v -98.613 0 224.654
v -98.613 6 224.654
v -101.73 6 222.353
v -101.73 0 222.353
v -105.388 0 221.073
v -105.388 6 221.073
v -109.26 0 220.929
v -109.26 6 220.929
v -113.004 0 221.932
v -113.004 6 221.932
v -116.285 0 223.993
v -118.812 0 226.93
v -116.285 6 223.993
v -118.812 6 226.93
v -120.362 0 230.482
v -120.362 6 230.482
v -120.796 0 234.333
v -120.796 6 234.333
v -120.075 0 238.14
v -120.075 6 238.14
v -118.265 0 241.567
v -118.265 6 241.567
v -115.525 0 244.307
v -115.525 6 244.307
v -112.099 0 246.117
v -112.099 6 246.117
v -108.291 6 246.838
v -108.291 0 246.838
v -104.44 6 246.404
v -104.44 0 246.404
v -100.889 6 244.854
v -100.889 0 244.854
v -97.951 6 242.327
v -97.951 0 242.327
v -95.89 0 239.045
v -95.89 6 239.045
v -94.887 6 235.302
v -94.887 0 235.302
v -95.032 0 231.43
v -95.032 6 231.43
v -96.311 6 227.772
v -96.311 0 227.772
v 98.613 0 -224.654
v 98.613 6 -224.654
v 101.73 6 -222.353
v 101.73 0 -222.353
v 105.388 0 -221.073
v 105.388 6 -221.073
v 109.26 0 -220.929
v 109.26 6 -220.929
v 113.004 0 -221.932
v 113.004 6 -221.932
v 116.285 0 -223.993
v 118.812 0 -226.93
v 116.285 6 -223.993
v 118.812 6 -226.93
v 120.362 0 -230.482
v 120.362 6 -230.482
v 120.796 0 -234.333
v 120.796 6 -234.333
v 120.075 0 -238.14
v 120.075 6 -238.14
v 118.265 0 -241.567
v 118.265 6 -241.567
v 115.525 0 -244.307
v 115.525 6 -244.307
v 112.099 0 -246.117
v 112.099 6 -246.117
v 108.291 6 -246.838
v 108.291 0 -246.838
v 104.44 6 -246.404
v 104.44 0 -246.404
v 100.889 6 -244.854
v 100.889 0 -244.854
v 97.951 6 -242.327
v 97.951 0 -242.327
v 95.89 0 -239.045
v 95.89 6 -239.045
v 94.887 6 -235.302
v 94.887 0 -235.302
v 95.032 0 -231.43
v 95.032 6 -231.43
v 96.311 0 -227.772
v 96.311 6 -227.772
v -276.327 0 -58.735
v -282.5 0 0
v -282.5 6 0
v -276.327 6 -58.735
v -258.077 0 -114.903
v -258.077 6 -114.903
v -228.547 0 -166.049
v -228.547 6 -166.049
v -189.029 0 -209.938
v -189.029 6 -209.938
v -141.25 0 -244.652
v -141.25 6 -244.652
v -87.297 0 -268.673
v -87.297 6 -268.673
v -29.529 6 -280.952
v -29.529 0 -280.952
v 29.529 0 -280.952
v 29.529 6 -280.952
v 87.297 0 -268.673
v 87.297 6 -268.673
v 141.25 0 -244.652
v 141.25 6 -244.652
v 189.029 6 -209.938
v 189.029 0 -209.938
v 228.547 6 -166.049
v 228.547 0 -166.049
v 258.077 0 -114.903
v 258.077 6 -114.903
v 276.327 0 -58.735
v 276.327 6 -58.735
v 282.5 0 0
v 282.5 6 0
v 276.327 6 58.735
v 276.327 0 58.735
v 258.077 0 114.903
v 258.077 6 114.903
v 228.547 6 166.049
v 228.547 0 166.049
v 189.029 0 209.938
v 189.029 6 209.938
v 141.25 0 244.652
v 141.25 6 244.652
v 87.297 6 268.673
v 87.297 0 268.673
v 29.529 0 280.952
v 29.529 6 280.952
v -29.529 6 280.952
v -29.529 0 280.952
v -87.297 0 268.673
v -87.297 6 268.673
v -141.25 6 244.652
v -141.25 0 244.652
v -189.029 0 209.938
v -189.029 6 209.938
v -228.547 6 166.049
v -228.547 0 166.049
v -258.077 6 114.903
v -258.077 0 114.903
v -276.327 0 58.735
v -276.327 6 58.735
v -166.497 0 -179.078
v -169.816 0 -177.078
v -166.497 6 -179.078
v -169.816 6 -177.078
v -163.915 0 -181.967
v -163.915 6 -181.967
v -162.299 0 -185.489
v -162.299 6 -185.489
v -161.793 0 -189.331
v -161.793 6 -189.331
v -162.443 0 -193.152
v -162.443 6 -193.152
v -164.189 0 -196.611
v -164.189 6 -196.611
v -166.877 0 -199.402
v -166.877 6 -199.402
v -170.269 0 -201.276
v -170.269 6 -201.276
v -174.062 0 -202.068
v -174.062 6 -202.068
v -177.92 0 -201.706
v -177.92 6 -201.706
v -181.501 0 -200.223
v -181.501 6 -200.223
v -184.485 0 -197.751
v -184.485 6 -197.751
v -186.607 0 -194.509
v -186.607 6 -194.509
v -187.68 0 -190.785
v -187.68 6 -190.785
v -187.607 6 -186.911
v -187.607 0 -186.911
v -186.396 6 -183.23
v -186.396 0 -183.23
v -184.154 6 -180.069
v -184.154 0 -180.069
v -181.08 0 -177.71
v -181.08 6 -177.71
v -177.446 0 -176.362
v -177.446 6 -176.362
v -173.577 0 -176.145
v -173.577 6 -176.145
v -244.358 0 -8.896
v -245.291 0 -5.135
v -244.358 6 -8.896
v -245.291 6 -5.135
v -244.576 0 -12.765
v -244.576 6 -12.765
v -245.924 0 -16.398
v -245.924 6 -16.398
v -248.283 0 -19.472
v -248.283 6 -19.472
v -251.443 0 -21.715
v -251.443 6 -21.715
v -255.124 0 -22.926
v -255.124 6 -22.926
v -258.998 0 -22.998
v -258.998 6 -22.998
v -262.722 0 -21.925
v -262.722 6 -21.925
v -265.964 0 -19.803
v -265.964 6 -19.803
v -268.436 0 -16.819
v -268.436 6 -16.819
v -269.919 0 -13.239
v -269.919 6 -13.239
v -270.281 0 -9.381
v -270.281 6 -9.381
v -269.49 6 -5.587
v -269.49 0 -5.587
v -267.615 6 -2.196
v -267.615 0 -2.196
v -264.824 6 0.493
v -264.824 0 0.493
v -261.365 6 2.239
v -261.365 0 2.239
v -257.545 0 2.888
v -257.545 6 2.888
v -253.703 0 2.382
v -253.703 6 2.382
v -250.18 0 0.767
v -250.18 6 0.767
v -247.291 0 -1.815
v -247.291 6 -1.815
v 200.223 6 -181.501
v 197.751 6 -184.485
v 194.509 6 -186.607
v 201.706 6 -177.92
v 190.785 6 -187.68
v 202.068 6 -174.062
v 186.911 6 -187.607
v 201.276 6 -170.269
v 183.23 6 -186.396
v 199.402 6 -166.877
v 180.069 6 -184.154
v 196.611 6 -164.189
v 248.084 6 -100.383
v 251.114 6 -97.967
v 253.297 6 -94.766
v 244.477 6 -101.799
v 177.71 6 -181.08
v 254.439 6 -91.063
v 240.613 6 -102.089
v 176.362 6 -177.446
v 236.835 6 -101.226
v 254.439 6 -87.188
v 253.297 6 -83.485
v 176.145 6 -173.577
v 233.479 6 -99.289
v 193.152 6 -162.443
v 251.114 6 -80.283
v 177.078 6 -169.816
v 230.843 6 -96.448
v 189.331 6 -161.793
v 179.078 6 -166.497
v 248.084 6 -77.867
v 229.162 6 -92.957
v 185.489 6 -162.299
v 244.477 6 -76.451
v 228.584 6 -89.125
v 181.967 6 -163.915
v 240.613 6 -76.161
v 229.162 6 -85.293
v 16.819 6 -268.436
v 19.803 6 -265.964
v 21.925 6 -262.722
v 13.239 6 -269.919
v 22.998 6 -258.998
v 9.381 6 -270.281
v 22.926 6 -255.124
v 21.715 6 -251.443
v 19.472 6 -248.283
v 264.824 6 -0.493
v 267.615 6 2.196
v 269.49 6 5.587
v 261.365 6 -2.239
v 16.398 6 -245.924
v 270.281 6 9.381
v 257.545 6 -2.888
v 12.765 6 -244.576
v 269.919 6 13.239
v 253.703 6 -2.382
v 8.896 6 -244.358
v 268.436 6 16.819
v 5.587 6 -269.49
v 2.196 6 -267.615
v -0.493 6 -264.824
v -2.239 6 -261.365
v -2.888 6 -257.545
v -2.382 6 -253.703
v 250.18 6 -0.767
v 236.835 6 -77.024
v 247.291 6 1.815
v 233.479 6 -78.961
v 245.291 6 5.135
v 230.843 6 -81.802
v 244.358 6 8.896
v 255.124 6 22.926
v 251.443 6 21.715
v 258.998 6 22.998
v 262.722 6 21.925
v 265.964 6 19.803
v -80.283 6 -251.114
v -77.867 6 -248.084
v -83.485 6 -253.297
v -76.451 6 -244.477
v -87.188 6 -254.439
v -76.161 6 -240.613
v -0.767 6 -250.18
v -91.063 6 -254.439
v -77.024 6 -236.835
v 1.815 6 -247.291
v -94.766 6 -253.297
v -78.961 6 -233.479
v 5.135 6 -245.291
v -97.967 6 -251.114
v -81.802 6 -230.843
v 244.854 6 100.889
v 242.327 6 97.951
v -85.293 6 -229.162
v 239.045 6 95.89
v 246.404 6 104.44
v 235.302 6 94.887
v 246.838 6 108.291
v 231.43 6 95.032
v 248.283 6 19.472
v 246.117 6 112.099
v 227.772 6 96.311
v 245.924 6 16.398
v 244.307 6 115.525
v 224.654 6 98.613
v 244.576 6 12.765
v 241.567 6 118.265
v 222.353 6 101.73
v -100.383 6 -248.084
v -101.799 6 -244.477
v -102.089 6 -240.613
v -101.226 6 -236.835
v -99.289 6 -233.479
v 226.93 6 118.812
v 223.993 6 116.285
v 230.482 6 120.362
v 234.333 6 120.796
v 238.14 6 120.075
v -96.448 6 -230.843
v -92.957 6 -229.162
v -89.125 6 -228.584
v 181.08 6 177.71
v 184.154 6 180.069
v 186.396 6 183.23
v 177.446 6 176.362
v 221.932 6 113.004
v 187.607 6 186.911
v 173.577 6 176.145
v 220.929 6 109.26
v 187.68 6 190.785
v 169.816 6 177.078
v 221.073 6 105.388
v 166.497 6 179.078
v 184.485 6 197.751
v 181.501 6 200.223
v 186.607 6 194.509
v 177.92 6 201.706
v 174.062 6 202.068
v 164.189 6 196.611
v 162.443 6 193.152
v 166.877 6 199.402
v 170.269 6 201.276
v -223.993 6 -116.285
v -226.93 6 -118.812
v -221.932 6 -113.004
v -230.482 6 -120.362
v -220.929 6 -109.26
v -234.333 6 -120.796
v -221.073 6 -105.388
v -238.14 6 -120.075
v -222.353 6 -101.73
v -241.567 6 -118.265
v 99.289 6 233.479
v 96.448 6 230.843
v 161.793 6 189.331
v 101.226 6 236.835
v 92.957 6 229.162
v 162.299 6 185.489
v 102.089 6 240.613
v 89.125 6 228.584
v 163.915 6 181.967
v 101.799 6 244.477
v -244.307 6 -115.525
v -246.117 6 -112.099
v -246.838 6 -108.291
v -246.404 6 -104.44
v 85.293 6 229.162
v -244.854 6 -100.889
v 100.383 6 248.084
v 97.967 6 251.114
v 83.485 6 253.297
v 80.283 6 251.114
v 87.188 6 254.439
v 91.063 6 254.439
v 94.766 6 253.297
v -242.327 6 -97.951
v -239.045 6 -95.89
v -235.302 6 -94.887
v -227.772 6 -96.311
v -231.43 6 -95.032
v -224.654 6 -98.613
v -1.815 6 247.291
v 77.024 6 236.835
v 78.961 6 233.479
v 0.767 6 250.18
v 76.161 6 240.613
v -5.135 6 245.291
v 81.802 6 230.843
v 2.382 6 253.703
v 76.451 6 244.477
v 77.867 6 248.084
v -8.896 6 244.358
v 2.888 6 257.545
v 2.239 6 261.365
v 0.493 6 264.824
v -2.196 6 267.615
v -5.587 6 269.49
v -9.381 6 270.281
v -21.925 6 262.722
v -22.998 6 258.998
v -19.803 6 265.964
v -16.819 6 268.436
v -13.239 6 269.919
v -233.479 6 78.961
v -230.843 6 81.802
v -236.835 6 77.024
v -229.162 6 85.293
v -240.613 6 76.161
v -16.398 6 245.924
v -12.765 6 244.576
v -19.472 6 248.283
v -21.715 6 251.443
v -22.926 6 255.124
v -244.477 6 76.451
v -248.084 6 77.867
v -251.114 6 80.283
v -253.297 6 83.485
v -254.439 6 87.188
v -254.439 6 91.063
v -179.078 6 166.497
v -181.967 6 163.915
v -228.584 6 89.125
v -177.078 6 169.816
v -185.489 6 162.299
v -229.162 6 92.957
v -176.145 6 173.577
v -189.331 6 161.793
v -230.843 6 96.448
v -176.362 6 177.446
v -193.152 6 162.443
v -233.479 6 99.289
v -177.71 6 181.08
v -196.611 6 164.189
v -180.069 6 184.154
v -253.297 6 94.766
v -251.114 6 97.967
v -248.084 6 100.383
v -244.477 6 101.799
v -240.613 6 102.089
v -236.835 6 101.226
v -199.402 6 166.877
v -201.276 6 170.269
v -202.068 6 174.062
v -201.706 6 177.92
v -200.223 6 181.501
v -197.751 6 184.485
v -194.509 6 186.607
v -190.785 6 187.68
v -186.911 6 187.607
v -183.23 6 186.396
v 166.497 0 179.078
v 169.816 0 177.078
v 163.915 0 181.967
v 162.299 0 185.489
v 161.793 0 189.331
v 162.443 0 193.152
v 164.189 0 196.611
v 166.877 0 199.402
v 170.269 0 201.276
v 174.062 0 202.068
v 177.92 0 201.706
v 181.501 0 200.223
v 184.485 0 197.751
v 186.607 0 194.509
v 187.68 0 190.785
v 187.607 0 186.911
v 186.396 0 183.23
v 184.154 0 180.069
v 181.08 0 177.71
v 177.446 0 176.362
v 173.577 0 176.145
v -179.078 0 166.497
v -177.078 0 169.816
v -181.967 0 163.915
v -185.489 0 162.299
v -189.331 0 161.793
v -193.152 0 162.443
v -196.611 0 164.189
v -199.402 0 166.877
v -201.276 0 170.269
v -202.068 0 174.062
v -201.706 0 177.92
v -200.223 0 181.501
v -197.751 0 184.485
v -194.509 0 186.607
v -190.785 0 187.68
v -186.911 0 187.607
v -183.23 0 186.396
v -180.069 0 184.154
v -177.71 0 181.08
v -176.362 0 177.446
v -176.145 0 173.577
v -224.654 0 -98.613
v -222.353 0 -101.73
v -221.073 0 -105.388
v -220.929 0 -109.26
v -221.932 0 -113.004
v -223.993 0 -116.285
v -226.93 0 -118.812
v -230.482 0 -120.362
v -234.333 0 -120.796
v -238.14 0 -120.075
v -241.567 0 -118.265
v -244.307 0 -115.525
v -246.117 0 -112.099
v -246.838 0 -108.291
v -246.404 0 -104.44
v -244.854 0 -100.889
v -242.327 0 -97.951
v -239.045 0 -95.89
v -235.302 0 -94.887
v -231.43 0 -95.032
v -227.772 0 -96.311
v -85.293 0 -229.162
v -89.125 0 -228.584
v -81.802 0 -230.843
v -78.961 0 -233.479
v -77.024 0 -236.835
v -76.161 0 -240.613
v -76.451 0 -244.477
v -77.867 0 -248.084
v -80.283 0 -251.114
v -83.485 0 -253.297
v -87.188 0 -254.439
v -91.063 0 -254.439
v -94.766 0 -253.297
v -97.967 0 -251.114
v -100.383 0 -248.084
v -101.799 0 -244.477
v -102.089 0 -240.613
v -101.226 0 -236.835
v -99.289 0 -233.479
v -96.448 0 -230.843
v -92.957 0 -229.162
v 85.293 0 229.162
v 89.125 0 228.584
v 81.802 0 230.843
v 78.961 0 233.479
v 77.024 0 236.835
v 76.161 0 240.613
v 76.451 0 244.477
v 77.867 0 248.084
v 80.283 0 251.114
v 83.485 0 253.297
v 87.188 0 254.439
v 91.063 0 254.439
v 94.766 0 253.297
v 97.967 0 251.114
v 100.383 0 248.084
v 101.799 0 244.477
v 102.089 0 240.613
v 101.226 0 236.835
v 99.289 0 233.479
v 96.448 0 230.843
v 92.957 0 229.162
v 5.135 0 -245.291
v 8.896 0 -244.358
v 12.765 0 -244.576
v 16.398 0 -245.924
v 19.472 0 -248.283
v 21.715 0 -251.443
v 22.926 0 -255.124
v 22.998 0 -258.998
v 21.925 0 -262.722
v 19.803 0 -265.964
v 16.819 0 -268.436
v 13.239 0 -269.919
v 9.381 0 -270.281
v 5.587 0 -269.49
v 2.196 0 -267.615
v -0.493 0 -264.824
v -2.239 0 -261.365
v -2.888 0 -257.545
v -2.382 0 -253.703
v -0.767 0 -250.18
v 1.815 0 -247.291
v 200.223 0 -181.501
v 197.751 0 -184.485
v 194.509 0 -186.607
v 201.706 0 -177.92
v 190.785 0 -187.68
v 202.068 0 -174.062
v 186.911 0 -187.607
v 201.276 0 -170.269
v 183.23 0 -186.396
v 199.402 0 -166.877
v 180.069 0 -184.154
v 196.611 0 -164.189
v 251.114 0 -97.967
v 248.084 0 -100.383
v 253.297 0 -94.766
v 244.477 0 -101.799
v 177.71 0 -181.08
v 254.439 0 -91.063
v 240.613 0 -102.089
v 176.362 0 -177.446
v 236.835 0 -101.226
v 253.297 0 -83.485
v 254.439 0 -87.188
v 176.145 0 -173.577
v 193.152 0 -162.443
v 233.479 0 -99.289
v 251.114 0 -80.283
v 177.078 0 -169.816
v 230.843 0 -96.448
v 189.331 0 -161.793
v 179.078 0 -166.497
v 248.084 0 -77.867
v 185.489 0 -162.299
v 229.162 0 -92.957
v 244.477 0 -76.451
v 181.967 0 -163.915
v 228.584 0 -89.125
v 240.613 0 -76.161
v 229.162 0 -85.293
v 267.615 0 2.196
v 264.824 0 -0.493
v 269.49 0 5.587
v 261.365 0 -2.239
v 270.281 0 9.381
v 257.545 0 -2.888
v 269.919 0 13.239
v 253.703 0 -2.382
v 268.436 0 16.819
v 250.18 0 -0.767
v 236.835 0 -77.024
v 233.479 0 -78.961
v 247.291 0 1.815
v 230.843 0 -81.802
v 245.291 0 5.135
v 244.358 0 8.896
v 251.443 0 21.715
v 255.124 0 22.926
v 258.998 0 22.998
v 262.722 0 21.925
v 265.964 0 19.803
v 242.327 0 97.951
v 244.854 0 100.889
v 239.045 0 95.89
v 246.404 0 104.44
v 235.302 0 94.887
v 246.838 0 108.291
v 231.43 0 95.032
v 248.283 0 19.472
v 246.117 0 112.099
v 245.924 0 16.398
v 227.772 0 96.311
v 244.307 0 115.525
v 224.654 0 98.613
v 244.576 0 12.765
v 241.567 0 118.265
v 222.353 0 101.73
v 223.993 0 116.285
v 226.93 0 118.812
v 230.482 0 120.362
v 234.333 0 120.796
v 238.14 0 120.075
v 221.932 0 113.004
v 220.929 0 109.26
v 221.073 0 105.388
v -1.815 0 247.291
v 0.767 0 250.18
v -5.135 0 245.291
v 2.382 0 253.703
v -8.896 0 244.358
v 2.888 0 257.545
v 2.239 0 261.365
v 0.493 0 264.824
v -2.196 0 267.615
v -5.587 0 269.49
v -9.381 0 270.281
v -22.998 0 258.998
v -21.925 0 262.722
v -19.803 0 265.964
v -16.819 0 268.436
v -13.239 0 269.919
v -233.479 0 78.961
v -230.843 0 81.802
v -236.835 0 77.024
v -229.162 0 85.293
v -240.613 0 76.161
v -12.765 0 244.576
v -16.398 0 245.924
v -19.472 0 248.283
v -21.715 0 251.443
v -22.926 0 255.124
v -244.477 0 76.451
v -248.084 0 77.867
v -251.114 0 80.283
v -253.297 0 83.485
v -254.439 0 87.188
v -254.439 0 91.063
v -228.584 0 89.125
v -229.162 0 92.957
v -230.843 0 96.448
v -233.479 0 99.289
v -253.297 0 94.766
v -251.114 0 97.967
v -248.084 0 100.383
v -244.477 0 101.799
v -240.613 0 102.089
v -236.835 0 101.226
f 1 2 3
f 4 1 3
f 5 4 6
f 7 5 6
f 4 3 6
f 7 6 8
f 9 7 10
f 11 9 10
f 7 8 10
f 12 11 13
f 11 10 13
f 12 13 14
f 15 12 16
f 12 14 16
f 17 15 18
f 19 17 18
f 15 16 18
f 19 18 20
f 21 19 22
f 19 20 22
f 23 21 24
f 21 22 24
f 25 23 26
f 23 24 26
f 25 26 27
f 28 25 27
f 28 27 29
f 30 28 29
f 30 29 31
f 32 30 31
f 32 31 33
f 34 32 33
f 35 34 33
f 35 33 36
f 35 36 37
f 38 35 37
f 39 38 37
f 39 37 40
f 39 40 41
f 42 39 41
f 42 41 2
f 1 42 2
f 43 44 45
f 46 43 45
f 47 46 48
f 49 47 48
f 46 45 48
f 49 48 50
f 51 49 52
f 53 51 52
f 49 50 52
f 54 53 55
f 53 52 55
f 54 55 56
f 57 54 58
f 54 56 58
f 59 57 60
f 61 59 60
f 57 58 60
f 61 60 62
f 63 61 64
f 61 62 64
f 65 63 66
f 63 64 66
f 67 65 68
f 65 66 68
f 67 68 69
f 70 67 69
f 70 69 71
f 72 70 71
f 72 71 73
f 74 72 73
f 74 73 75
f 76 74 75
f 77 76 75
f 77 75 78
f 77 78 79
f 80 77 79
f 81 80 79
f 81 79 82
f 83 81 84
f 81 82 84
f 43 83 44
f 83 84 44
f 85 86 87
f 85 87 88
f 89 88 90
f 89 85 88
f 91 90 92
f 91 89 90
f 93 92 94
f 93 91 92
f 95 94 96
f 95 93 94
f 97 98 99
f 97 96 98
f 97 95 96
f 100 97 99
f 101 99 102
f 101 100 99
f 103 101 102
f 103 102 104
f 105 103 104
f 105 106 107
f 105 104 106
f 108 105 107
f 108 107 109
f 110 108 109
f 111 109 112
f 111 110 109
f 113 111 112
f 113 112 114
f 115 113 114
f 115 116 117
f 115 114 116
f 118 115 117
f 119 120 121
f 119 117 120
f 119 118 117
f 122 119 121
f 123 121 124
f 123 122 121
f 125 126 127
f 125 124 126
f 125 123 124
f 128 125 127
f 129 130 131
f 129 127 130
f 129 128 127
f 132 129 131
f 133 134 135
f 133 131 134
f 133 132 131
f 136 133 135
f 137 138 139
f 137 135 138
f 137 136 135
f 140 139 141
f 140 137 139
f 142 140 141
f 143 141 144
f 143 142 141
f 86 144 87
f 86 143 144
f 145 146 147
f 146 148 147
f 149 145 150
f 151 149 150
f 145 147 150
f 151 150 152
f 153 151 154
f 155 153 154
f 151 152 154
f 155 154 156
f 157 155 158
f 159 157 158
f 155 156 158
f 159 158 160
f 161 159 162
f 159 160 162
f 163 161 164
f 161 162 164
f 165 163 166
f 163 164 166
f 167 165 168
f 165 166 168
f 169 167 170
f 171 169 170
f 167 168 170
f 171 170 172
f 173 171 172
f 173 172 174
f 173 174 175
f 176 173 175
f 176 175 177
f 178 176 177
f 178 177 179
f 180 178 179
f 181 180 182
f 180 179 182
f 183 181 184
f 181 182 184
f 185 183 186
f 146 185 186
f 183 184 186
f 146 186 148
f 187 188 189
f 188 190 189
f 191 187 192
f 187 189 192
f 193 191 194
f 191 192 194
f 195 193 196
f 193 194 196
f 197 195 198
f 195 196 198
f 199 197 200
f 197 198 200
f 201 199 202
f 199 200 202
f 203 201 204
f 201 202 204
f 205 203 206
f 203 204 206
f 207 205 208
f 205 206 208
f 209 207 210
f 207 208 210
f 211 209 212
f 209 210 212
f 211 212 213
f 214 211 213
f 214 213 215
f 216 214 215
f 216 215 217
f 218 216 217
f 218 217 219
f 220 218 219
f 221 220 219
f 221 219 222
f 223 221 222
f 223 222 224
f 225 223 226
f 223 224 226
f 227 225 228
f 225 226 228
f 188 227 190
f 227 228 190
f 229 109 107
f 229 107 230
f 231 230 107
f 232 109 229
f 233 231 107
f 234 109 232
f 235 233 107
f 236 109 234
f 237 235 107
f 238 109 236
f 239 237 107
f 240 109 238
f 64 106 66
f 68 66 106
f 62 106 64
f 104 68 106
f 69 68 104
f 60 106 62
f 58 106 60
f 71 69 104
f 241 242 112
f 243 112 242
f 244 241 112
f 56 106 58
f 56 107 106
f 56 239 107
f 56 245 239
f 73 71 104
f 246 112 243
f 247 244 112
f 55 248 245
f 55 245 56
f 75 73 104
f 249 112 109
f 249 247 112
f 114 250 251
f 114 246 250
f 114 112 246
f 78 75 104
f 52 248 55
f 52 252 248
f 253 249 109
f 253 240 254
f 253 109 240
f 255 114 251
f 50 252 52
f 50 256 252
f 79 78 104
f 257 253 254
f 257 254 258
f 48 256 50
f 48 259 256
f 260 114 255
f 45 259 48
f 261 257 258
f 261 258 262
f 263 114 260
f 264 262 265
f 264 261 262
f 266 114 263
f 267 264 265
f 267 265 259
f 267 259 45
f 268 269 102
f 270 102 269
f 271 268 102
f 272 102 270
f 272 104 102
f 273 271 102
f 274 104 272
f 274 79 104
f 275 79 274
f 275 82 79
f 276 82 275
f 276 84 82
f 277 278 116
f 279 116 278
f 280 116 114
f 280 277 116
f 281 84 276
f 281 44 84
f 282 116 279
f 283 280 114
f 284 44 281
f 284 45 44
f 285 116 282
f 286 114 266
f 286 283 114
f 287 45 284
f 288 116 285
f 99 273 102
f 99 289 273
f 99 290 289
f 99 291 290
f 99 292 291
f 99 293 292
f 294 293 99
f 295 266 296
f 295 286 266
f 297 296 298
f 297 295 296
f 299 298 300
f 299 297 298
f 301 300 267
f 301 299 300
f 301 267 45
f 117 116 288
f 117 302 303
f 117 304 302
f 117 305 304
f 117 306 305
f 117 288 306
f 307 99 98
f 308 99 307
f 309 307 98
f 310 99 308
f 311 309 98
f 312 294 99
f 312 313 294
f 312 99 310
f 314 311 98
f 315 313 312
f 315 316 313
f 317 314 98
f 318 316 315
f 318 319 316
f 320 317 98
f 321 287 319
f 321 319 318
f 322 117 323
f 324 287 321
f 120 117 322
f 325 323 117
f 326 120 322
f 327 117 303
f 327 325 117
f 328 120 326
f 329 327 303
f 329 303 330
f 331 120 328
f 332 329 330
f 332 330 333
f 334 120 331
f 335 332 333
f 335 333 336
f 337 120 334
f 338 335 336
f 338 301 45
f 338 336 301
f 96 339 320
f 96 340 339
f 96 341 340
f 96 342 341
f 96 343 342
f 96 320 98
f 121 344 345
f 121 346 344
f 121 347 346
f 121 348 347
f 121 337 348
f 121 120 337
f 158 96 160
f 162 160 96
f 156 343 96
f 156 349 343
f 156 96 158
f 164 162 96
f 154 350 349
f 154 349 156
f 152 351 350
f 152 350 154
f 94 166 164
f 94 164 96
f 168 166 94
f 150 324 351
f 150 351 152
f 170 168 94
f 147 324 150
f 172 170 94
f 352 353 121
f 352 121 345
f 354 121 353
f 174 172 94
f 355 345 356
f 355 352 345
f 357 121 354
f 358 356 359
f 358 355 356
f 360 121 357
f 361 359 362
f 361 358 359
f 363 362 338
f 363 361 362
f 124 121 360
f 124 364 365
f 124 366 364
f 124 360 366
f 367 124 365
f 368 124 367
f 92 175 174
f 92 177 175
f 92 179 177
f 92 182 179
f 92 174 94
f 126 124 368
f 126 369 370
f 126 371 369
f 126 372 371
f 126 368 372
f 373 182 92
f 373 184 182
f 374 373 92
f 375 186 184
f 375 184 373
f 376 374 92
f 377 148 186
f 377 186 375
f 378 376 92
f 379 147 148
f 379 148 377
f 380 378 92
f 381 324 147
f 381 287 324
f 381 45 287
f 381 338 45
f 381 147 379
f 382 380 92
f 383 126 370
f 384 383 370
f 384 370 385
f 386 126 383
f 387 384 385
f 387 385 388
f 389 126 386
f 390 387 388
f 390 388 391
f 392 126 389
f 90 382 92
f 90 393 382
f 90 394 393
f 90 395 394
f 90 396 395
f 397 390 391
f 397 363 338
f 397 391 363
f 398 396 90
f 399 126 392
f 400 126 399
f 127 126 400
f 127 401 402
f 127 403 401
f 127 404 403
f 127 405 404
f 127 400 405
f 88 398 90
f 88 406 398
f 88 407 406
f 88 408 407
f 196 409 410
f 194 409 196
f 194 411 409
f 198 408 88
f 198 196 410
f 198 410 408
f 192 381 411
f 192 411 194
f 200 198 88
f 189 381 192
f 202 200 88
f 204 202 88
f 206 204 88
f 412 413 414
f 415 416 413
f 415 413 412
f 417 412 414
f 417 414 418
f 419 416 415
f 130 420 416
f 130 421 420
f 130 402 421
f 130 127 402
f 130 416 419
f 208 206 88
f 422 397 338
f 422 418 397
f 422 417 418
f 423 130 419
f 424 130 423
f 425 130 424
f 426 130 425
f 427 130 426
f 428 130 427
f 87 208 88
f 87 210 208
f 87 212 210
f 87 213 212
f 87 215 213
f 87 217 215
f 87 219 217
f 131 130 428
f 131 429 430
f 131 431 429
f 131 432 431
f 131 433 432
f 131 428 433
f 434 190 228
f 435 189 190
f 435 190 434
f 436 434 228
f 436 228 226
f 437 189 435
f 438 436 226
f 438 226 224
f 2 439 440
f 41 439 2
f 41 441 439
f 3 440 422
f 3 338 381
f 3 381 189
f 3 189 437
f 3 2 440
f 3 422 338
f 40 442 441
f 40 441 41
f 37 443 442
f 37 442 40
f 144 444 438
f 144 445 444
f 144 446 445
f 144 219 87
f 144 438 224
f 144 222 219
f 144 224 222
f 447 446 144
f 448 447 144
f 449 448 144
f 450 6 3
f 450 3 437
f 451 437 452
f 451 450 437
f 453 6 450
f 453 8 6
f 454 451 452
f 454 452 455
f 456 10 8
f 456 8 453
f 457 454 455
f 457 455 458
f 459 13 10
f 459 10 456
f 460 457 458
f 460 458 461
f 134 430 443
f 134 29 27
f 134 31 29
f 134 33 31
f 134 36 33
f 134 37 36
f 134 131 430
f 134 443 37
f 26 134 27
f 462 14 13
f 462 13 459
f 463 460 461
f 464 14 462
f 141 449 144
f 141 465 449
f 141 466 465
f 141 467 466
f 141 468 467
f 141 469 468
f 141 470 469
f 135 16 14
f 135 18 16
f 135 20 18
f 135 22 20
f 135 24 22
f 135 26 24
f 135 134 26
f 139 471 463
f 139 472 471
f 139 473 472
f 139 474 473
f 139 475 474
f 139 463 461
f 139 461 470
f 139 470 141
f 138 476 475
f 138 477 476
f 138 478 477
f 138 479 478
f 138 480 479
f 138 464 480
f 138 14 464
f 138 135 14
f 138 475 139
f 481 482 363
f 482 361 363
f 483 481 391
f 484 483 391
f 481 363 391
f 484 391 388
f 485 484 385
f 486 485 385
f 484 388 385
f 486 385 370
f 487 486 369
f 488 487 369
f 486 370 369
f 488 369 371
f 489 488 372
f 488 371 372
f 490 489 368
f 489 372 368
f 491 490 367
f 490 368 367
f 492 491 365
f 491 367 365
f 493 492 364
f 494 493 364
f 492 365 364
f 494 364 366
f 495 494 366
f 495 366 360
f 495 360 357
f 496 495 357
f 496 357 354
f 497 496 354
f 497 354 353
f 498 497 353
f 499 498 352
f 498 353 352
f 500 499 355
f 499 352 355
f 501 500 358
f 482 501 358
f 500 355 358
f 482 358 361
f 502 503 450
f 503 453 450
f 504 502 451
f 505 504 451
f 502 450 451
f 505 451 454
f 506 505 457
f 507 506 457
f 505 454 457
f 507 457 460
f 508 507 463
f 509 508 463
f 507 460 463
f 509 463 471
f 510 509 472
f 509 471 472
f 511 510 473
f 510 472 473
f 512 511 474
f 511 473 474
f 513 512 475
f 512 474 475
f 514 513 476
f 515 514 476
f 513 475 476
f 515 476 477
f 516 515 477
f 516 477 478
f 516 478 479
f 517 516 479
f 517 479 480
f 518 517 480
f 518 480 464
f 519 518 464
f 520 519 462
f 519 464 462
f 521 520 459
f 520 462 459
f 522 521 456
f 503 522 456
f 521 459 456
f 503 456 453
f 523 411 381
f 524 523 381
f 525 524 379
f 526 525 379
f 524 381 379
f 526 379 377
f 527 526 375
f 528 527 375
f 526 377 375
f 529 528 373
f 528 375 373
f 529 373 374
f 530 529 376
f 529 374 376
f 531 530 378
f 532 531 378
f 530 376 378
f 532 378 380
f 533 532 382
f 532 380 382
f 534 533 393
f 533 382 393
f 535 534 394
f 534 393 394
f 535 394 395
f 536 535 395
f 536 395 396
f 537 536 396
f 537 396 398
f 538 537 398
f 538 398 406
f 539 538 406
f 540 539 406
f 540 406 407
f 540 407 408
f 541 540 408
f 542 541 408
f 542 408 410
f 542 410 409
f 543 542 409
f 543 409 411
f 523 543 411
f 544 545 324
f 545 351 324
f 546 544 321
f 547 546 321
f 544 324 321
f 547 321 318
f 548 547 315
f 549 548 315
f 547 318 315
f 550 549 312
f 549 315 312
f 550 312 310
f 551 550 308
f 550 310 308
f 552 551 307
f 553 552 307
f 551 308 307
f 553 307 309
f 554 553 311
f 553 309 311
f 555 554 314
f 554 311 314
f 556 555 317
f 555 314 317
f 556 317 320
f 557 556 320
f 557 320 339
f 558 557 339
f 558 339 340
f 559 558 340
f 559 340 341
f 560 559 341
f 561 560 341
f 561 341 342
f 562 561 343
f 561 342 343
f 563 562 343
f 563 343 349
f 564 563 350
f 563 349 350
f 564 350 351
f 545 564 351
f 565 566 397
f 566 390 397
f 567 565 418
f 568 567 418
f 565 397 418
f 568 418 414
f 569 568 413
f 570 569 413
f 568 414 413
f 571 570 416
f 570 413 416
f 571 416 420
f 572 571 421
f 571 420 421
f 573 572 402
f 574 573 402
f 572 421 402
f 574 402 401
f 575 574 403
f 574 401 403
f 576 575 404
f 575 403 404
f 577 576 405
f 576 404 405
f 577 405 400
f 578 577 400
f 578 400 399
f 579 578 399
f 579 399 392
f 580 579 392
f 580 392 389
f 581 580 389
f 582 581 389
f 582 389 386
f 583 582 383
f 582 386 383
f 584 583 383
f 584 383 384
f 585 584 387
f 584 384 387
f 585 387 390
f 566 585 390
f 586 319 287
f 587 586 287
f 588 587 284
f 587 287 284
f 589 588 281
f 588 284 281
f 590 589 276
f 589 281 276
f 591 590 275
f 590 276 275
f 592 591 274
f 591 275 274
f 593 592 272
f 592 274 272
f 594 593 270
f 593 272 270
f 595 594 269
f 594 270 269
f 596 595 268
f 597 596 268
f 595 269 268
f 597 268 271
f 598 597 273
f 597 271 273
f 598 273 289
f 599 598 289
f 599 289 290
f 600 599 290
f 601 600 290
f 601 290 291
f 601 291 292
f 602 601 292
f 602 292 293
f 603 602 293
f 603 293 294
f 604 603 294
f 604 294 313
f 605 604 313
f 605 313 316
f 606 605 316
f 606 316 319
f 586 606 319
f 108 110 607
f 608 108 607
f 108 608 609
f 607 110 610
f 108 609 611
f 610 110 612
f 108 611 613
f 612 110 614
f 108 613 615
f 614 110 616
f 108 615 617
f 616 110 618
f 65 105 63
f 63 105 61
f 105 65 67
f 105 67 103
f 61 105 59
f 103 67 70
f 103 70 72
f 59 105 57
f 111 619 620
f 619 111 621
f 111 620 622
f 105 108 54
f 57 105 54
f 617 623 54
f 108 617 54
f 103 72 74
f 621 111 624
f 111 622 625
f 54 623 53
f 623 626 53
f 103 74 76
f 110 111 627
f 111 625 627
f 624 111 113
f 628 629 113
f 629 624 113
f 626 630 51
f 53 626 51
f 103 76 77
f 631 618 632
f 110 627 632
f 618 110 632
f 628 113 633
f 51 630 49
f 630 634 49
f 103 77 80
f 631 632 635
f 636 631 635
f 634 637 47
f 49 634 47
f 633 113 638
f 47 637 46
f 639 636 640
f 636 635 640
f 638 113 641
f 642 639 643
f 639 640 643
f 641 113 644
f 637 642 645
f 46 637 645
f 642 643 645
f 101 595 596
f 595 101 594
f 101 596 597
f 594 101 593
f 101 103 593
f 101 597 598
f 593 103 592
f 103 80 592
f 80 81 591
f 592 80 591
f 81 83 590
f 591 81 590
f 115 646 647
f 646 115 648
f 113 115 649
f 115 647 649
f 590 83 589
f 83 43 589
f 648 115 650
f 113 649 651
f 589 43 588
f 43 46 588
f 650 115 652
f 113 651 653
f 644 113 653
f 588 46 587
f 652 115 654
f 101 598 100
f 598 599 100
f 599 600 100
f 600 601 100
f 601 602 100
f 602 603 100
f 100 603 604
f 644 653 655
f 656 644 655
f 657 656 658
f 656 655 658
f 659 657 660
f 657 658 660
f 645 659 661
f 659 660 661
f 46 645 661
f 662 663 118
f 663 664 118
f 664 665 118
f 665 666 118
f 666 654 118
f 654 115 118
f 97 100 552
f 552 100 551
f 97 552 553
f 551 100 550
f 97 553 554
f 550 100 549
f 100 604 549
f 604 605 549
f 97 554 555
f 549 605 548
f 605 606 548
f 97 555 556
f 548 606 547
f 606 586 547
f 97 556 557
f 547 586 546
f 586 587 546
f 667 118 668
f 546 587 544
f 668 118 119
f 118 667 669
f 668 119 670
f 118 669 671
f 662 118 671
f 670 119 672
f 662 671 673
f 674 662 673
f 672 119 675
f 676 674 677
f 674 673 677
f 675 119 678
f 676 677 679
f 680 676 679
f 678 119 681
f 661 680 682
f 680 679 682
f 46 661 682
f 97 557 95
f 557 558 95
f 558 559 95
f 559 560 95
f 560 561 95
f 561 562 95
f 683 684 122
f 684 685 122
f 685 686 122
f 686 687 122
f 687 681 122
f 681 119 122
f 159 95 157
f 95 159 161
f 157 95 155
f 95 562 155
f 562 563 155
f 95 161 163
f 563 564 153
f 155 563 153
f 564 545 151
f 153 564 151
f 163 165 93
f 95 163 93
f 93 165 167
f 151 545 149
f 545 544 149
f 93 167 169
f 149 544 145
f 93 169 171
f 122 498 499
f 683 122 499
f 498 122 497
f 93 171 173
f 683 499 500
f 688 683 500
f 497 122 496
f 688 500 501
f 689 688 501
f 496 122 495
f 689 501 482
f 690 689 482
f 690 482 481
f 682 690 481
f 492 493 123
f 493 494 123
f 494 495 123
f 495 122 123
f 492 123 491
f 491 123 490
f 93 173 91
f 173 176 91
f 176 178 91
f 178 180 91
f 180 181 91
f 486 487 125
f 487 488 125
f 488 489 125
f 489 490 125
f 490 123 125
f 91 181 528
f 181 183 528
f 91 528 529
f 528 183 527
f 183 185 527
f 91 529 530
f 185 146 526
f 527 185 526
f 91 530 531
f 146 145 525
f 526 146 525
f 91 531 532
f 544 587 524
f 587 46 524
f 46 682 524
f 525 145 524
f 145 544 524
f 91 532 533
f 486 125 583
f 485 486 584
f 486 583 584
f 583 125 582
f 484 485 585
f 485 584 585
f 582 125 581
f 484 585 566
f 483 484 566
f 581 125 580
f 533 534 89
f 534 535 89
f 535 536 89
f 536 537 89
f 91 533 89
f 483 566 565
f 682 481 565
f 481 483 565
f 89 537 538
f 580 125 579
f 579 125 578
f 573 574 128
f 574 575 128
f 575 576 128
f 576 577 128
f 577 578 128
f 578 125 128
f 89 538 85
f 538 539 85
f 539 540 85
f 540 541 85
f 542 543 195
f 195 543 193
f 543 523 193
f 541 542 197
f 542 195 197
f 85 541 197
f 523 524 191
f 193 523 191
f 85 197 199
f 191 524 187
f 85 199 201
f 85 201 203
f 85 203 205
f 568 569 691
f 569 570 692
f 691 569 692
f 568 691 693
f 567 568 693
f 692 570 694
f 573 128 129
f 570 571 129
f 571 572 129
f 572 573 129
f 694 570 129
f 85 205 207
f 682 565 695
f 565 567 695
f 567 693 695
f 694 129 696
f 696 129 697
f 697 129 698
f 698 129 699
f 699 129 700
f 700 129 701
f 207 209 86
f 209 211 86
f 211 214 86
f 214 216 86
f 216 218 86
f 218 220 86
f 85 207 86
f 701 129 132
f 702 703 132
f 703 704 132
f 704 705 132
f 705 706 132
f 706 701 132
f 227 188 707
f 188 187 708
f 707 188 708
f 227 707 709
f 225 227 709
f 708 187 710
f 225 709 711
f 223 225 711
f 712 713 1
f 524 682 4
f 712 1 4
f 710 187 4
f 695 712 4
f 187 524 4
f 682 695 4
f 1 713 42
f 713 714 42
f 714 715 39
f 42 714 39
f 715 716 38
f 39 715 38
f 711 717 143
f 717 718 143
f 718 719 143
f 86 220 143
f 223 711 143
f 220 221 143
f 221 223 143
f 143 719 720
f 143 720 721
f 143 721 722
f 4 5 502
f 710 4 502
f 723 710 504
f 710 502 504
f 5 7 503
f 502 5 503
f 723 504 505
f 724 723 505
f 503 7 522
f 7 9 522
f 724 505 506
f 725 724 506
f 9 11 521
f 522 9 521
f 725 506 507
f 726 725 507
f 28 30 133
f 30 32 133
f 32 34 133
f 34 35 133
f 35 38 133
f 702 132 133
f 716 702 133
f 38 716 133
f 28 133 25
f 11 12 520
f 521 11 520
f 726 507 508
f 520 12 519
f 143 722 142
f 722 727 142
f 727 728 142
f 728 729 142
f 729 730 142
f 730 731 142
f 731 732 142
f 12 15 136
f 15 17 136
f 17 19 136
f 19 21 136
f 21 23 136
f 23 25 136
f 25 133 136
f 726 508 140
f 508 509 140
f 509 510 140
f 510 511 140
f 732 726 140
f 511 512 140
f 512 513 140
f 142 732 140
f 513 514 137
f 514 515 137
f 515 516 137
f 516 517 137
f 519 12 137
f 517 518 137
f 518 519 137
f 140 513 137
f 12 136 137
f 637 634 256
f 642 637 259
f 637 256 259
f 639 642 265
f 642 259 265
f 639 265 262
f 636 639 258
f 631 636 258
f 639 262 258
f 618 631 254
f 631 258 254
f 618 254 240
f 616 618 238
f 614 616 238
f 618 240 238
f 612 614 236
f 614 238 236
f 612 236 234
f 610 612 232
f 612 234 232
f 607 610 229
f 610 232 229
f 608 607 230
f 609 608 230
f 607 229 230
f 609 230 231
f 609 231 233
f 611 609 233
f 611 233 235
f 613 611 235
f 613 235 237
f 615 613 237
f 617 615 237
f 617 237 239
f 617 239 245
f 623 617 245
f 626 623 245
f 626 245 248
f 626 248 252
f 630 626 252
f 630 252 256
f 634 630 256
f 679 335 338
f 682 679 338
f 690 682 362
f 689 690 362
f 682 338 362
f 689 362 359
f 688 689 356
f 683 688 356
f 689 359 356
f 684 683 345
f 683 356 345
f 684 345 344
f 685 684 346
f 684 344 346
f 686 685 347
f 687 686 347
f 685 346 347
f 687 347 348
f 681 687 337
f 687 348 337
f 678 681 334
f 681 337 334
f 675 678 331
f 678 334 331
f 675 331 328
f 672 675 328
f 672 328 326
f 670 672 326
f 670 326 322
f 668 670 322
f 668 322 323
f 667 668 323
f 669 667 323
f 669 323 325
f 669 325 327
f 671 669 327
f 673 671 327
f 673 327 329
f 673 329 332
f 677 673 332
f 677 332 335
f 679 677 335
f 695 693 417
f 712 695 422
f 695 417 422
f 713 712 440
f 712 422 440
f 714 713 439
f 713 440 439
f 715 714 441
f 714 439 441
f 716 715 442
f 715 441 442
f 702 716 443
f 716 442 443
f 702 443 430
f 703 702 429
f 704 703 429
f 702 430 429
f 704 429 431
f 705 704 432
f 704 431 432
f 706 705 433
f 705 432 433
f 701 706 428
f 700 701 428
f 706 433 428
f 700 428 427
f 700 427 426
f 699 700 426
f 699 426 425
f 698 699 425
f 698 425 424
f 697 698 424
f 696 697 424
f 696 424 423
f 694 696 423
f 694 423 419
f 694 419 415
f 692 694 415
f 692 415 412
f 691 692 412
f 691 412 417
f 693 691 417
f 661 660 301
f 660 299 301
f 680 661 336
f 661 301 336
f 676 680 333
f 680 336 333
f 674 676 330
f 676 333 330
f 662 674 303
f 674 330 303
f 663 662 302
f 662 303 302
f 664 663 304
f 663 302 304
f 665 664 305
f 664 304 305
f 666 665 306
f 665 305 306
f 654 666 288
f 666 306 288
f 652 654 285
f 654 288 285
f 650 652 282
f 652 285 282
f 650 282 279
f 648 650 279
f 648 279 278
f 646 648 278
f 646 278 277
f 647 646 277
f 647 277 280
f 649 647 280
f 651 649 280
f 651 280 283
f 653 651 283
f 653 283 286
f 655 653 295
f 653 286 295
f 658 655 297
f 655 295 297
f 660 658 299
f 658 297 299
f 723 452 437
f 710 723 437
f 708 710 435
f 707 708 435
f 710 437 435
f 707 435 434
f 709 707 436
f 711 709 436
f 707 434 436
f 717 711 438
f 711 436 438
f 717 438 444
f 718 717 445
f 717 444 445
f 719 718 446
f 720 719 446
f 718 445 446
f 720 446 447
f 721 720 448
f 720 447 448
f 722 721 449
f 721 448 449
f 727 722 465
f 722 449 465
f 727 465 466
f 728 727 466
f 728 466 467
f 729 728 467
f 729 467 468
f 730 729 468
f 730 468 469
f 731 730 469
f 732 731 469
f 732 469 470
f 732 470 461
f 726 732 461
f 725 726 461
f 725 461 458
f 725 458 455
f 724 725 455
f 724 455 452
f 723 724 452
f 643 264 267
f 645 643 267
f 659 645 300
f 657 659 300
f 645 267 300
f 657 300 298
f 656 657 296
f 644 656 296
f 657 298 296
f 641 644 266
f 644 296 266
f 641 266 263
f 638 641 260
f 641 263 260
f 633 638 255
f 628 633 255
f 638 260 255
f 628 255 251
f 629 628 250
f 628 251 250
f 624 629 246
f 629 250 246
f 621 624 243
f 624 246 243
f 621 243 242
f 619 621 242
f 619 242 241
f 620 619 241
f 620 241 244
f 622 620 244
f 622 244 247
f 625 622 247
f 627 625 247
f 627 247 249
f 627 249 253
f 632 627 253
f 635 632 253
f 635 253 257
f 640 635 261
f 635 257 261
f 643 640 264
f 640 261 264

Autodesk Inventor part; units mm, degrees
ref_plane "YZ Plane" through (0, 0, 0) normal (1, 0, 0) x (0, 1, 0)
ref_plane "XZ Plane" through (0, 0, 0) normal (0, 1, 0) x (-1, 0, 0)
ref_plane "XY Plane" through (0, 0, 0) normal (0, 0, 1) x (1, 0, 0)
sketch "Sketch1" plane through (0, 0, 0) normal (0, 1, 0) x (-1, 0, 0)
  circle A0 centre (0, 0) radius 282.5
  dimension "d0" = 565
extrude "Extrusion1" add sketch "Sketch1" along normal blind 6
sketch "Sketch2" plane through (0, 6, 0) normal (0, 1, 0) x (1, 0, 0)
  circle A0 centre (0, 0) radius 257.5 construction
  line L0 (0, 0) -> (-257.5, 0)
  line L1 (0, 0) -> (-241.5843, -89.1251) construction
  circle A1 centre (-241.5843, -89.1251) radius 13
  dimension "d4" = 515
  dimension "d15" = 20.25
  dimension "d16" = 26
extrude "Cut1" cut sketch "Sketch2" against normal through all
pattern_circular "Circular Pattern1" count 16 over 360 about axis through (0, 0, 0) along (0, 1, 0) of "Cut1"
equation "\"d6\" = Thickness"
equation "\"BendRadius\" = Thickness"
equation "\"BendReliefWidth\" = Thickness"
equation "\"BendReliefDepth\" = 0.5 * Thickness"
equation "\"CornerReliefSize\" = 4 * Thickness"
equation "\"MinimumRemnant\" = 2 * Thickness"
equation "\"TransitionRadius\" = BendRadius"
equation "\"JacobiRadiusSize\" = BendRadius"
equation "\"GapSize\" = Thickness"
equation "\"d5\" = Thickness"
equation "\"Thickness\" = 6"
properties part number "TZS 1212 charging hatch 500 mm" material "Steel"
